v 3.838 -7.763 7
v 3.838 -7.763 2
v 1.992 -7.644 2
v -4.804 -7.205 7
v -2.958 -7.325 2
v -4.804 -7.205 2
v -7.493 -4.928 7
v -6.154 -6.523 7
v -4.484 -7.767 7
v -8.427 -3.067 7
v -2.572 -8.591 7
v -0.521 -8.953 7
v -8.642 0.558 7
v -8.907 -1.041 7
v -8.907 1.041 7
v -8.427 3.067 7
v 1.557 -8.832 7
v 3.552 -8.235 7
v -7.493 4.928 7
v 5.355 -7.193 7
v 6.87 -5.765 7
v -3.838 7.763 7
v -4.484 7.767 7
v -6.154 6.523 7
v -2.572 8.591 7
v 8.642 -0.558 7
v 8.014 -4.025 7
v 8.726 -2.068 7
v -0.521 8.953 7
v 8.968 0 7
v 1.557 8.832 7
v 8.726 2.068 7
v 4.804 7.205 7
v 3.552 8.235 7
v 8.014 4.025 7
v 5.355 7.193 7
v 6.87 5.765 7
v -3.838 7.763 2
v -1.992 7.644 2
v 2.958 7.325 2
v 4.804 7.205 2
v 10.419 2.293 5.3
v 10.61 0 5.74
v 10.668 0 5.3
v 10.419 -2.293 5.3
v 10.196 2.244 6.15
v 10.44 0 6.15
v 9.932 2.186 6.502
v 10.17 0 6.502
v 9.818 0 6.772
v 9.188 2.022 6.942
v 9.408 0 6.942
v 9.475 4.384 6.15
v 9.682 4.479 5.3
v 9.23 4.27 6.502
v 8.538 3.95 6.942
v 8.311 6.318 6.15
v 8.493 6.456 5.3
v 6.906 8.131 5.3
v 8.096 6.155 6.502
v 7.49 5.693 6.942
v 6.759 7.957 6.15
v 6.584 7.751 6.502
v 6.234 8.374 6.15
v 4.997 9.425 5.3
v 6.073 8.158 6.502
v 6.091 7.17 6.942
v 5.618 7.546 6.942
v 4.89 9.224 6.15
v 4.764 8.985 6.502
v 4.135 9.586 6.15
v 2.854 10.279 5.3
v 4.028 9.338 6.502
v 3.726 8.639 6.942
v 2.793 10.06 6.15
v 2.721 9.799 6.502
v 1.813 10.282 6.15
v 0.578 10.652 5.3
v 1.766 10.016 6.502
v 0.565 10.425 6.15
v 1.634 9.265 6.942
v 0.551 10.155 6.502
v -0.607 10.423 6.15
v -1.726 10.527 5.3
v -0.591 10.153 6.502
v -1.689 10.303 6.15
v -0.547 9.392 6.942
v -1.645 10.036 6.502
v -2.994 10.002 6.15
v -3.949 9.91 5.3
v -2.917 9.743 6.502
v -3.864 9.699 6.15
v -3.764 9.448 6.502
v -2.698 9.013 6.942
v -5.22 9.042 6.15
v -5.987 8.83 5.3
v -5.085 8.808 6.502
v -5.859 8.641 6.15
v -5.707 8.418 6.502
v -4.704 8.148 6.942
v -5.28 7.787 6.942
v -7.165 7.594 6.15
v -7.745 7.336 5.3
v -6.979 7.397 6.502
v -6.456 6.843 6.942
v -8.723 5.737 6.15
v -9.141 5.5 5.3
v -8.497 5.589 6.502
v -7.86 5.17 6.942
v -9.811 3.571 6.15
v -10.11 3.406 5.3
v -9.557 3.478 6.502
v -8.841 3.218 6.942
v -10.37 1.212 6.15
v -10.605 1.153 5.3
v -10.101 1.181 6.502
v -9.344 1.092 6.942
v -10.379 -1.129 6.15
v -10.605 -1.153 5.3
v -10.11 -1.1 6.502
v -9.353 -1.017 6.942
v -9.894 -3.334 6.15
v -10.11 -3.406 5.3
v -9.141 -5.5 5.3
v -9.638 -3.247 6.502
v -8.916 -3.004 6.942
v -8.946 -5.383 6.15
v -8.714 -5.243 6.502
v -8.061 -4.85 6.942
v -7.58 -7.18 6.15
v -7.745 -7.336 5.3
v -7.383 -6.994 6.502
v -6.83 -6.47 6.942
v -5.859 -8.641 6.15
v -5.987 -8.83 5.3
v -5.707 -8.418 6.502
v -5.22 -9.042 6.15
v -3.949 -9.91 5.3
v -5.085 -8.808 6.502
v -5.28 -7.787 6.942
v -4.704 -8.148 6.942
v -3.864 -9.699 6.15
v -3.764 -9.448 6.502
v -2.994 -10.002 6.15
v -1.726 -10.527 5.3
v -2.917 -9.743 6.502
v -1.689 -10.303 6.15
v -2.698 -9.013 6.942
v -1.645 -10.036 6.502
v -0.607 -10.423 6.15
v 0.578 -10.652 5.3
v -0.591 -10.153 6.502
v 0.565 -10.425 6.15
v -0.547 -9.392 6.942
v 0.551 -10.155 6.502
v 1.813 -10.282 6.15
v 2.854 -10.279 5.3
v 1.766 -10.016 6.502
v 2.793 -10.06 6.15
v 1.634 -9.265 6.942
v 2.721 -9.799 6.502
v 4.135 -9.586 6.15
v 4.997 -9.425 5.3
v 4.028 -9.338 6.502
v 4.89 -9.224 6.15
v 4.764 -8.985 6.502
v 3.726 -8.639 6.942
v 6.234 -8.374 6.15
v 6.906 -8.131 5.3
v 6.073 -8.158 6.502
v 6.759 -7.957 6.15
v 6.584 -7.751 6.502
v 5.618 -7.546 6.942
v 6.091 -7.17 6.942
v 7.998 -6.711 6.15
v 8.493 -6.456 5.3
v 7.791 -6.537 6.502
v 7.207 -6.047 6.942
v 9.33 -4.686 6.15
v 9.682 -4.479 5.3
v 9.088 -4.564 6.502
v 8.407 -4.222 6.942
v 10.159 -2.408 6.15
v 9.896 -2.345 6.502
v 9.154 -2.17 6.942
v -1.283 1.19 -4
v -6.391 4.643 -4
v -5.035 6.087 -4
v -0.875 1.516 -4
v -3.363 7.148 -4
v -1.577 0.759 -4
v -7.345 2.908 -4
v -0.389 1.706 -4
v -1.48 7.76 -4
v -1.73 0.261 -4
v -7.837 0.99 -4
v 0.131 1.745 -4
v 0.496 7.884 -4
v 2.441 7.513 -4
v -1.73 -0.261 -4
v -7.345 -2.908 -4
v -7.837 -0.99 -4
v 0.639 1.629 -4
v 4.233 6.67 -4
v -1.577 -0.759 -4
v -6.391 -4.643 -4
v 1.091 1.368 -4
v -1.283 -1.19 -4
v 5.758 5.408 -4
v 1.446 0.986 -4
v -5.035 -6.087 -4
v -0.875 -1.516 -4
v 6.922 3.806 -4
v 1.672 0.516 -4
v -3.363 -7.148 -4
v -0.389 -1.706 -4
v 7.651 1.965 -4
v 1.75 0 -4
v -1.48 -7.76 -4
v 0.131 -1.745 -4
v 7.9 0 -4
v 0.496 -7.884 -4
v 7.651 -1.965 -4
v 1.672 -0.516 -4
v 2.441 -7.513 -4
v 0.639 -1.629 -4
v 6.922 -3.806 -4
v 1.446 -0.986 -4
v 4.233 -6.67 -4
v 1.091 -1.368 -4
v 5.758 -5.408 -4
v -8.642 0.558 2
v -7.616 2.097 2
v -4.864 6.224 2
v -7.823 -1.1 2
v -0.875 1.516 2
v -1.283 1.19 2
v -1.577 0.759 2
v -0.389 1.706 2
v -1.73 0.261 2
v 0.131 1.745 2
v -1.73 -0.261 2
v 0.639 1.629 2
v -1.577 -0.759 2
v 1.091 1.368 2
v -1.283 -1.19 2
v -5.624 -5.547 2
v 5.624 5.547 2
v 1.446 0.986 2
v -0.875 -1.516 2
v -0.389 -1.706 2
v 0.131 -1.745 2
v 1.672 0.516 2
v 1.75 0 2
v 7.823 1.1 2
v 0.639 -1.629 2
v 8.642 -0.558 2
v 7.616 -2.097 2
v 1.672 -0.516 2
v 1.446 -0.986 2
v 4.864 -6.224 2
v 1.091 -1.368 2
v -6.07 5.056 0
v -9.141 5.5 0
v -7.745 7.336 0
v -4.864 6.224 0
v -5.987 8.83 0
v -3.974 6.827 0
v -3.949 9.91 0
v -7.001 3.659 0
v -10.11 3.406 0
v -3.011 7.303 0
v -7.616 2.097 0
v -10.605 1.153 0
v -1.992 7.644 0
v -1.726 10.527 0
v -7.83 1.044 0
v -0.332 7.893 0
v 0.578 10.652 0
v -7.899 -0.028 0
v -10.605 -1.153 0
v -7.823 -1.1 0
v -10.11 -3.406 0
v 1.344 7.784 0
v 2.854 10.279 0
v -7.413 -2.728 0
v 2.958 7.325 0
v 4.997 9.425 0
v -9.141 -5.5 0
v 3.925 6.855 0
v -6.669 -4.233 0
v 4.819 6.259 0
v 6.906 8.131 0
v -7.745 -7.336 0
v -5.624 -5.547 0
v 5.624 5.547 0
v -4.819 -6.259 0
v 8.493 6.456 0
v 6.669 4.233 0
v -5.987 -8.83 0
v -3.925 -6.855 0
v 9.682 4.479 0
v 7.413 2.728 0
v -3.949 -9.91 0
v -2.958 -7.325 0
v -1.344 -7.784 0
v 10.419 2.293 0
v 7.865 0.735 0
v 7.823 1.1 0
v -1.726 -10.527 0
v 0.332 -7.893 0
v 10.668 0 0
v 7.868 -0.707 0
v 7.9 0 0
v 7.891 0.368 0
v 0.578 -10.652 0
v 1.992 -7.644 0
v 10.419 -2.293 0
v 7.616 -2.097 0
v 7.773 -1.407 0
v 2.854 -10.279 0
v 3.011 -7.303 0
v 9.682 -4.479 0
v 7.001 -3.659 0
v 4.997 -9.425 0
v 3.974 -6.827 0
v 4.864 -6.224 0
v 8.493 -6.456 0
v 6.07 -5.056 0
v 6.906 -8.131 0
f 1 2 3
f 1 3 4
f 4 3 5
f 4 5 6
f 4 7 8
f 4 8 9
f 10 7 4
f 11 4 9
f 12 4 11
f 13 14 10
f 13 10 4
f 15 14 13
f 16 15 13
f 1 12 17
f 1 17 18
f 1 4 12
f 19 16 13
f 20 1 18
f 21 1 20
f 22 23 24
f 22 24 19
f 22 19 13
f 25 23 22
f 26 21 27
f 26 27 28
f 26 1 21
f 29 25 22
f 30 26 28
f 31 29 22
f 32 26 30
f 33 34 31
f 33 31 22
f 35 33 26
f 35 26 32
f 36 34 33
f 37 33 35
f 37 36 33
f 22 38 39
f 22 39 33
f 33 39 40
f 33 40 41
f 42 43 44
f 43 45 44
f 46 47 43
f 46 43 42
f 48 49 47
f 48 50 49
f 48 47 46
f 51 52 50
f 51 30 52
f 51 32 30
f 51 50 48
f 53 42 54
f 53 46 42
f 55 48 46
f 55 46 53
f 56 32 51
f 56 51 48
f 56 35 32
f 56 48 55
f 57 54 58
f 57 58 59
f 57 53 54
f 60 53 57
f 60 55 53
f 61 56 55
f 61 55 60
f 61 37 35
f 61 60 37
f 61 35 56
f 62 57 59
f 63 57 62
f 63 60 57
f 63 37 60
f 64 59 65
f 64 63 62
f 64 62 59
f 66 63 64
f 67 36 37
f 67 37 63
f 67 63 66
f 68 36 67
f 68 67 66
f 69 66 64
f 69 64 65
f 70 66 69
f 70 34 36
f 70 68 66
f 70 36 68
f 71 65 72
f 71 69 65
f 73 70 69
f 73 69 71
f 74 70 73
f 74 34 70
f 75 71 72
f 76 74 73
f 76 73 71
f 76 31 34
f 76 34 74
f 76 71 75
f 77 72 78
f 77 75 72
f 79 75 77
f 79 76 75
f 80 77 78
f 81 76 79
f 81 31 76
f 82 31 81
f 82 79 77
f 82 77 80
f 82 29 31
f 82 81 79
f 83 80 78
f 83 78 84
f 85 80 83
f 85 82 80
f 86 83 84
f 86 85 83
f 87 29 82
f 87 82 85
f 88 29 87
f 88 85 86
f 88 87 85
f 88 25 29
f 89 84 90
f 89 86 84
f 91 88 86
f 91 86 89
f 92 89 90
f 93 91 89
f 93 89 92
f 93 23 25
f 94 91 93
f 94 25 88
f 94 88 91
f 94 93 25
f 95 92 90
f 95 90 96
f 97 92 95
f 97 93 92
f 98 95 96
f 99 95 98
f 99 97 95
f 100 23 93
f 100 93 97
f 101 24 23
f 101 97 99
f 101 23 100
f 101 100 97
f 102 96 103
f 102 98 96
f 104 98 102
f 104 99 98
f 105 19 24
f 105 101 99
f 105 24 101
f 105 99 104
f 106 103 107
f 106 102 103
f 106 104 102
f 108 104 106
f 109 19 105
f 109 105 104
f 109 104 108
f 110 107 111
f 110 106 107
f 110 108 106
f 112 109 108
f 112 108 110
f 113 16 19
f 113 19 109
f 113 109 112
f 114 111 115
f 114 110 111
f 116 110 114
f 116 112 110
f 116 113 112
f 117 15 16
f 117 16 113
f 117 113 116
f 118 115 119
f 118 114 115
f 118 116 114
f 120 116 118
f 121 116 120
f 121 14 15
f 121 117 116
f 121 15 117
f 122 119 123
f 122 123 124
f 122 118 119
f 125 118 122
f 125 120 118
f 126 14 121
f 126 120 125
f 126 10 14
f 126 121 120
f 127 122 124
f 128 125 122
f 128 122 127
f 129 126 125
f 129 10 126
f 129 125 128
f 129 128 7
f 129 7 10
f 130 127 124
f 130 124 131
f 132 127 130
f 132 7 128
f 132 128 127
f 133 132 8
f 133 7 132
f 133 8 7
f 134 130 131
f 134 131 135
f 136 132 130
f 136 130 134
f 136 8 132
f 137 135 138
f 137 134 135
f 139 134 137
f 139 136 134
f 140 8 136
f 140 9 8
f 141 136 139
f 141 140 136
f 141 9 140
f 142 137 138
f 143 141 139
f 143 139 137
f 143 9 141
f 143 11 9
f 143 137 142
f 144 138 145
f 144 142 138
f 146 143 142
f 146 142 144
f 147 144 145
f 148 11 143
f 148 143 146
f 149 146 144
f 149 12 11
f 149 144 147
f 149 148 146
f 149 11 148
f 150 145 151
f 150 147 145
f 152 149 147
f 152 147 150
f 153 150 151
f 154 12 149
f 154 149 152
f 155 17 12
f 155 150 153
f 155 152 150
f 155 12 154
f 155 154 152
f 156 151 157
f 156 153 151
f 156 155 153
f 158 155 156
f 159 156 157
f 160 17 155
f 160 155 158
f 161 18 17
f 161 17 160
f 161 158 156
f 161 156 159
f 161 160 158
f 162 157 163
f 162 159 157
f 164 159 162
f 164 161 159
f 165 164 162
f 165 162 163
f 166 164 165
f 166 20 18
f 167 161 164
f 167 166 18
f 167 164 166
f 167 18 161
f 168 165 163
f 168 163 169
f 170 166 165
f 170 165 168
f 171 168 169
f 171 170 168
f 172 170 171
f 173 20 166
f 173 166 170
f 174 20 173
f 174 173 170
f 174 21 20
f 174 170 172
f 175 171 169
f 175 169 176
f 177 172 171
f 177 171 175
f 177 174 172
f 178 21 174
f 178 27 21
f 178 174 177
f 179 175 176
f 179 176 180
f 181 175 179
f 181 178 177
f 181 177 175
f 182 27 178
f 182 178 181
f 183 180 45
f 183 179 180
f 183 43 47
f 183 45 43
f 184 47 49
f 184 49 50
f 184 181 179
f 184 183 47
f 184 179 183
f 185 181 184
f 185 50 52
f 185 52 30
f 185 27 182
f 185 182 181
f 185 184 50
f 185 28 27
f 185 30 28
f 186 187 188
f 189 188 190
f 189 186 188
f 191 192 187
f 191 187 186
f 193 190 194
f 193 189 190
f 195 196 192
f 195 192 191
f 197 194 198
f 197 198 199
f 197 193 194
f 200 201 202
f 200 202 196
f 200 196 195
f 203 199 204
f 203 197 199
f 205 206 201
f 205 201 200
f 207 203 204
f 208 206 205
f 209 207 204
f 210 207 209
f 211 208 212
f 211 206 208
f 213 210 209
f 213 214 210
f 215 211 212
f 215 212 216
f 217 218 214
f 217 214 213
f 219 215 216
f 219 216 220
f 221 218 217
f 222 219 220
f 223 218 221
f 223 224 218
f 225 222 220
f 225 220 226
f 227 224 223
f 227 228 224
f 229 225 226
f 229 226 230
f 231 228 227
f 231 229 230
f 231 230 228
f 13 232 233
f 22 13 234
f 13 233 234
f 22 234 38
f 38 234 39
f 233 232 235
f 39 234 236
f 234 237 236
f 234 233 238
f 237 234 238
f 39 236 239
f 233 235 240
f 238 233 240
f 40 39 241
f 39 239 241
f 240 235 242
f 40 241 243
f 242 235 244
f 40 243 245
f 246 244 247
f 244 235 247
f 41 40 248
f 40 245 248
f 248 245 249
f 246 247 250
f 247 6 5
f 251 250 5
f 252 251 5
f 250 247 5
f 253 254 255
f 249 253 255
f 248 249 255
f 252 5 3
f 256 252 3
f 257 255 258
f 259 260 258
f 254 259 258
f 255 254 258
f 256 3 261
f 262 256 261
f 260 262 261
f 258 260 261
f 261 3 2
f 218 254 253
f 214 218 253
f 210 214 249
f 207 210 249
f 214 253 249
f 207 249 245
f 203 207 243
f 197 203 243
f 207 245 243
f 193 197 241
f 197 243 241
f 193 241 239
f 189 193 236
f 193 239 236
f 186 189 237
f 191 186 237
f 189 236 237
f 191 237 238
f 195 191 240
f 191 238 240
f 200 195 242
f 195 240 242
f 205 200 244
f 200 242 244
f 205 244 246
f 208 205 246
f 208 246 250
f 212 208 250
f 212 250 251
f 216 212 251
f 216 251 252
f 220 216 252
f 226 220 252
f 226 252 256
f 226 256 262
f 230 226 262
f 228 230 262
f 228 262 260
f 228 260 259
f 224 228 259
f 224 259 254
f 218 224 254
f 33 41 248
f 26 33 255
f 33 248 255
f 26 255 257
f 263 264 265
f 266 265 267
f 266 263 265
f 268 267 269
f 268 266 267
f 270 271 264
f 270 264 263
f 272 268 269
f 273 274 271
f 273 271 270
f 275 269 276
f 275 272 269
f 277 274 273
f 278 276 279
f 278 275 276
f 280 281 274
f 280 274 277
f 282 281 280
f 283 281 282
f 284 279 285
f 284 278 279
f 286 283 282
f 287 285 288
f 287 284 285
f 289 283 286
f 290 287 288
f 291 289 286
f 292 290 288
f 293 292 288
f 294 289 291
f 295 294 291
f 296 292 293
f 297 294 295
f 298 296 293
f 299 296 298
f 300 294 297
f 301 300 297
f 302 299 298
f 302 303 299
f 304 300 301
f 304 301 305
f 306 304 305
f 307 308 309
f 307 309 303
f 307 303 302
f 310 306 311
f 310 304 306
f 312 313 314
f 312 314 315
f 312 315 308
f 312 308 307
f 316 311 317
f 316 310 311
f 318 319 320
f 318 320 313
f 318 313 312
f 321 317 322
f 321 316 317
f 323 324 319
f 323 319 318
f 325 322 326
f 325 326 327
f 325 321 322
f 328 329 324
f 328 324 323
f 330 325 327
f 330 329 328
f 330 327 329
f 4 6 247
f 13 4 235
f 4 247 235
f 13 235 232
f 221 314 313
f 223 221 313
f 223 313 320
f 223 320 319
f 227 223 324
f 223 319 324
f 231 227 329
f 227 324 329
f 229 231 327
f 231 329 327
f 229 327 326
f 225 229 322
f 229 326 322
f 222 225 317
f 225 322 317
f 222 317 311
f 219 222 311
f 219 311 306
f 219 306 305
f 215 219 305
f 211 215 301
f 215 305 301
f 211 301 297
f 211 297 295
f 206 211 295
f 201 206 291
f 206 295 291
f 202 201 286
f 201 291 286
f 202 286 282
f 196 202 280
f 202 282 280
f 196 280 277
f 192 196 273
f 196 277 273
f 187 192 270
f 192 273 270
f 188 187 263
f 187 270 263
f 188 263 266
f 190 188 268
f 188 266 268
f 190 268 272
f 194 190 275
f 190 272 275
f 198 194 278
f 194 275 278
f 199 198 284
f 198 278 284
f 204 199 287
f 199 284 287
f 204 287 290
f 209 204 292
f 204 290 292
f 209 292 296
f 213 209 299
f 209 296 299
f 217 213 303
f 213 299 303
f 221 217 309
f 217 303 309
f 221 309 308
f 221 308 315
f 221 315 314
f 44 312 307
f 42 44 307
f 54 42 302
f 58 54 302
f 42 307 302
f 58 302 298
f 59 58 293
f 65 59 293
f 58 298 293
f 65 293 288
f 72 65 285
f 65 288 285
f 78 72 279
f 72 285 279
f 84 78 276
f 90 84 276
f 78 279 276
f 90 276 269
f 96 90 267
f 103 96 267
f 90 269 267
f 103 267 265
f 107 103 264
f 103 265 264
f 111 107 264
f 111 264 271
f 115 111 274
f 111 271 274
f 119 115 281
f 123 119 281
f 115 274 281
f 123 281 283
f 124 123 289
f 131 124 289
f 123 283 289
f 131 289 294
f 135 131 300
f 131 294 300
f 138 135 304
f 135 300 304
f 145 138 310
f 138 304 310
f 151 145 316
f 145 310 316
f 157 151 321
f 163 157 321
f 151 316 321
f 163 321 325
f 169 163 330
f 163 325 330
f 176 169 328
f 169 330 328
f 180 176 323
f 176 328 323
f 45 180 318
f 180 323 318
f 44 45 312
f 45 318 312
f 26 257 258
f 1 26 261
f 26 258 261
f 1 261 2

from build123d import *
from build123d import SkipClean  # not in build123d's __all__

# Parameters (mm, degrees)
F0_R      = 10.668
F1_DEPTH  = 7
F4_DEPTH  = 2
F7_DEPTH  = 2
F8_R      = 7.8995
F9_DEPTH  = 6
F5_R      = 1.75
F10_DEPTH = 25
F11_R     = 1.7


with BuildPart() as f1:
    # F0 (on Top) → F1 (new body)
    with BuildSketch(Plane.XY):
        Circle(F0_R)
        Polygon((-4.8043411611, -7.2054358652), (-8.6422610852, 0.5579635614), (-3.837919924, 7.7633994266), (4.8043411611, 7.2054358652), (8.6422610852, -0.5579635614), (3.837919924, -7.7633994266), align=None, mode=Mode.SUBTRACT)
    extrude(amount=F1_DEPTH)

    # F3 (on offset) → F4 (join)
    with BuildSketch(Plane(origin=(0, 0, 2), x_dir=(1, 0, 0), z_dir=(0, 0, -1))):
        with BuildLine():
            ThreePointArc((1.9919788729, 7.6442213744), (3.5007804976, 7.081428963), (4.8641016704, 6.2243566085))
            Line((4.8641016704, 6.2243566085), (3.837919924, 7.7633994266))
            Line((3.837919924, 7.7633994266), (1.9919788729, 7.6442213744))
        make_face()
        with BuildLine():
            ThreePointArc((-5.6241004659, 5.5472149949), (-4.3823071282, 6.5724793255), (-2.95840011, 7.3246139174))
            Line((-2.95840011, 7.3246139174), (-4.8043411611, 7.2054358652))
            Line((-4.8043411611, 7.2054358652), (-5.6241004659, 5.5472149949))
        make_face()
        with BuildLine():
            ThreePointArc((-7.6160793388, -2.0970063795), (-7.8830876258, -0.5089496375), (-7.8225017804, 1.1002573089))
            Line((-7.8225017804, 1.1002573089), (-8.6422610852, -0.5579635614))
            Line((-8.6422610852, -0.5579635614), (-7.6160793388, -2.0970063795))
        make_face()
        with BuildLine():
            Line((-3.837919924, -7.7633994266), (-1.9919788729, -7.6442213744))
            ThreePointArc((-1.9919788729, -7.6442213744), (-3.5007804976, -7.081428963), (-4.8641016704, -6.2243566085))
            Line((-4.8641016704, -6.2243566085), (-3.837919924, -7.7633994266))
        make_face()
        with BuildLine():
            ThreePointArc((7.6160793388, 2.0970063795), (7.8283241817, 1.0580362738), (7.8995, 0))
            ThreePointArc((7.8995, 0), (7.880226934, -0.5514741317), (7.8225017804, -1.1002573089))
            Line((7.8225017804, -1.1002573089), (8.6422610852, 0.5579635614))
            Line((8.6422610852, 0.5579635614), (7.6160793388, 2.0970063795))
        make_face()
        with BuildLine():
            Line((4.8043411611, -7.2054358652), (5.6241004659, -5.5472149949))
            ThreePointArc((5.6241004659, -5.5472149949), (4.3823071282, -6.5724793255), (2.95840011, -7.3246139174))
            Line((2.95840011, -7.3246139174), (4.8043411611, -7.2054358652))
        make_face()
    extrude(amount=F4_DEPTH)

    # F6 (on face) → F7 (cut)
    with BuildSketch(Plane(origin=(0, 0, 0), x_dir=(1, 0, 0), z_dir=(0, 0, -1))):
        with BuildLine():
            Line((4.8641016704, 6.2243566085), (7.6160793388, 2.0970063795))
            ThreePointArc((7.6160793388, 2.0970063795), (6.5724793255, 4.3823071282), (4.8641016704, 6.2243566085))
        make_face()
        with BuildLine():
            ThreePointArc((5.6241004659, -5.5472149949), (7.081428963, -3.5007804976), (7.8225017804, -1.1002573089))
            Line((7.8225017804, -1.1002573089), (5.6241004659, -5.5472149949))
        make_face()
        with BuildLine():
            ThreePointArc((-1.9919788729, -7.6442213744), (0.5089496375, -7.8830876258), (2.95840011, -7.3246139174))
            Line((2.95840011, -7.3246139174), (-1.9919788729, -7.6442213744))
        make_face()
        with BuildLine():
            ThreePointArc((-7.6160793388, -2.0970063795), (-6.5724793255, -4.3823071282), (-4.8641016704, -6.2243566085))
            Line((-4.8641016704, -6.2243566085), (-7.6160793388, -2.0970063795))
        make_face()
        with BuildLine():
            Line((-7.8225017804, 1.1002573089), (-5.6241004659, 5.5472149949))
            ThreePointArc((-5.6241004659, 5.5472149949), (-7.081428963, 3.5007804976), (-7.8225017804, 1.1002573089))
        make_face()
        with BuildLine():
            Line((-2.95840011, 7.3246139174), (1.9919788729, 7.6442213744))
            ThreePointArc((1.9919788729, 7.6442213744), (-0.5089496375, 7.8830876258), (-2.95840011, 7.3246139174))
        make_face()
    with SkipClean():  # cleaning this boolean's faces spoils the solid; the shape is the same uncleaned
        extrude(amount=-F7_DEPTH, mode=Mode.SUBTRACT)

    # F8 (on offset) → F9 (join)
    with BuildSketch(Plane(origin=(0, 0, 2), x_dir=(1, 0, 0), z_dir=(0, 0, -1))):
        Circle(F8_R)
    extrude(amount=F9_DEPTH)

    # F5 (on face) → F10 (cut)
    with BuildSketch(Plane.XY.offset(2)):
        Circle(F5_R)
    extrude(amount=-F10_DEPTH, mode=Mode.SUBTRACT)

    # F11
    f11_edges = [f1.edges().sort_by_distance(p)[0] for p in [
        (-10.668, 0, 7),
    ]]
    fillet(f11_edges, radius=F11_R)


solid = f1.part
